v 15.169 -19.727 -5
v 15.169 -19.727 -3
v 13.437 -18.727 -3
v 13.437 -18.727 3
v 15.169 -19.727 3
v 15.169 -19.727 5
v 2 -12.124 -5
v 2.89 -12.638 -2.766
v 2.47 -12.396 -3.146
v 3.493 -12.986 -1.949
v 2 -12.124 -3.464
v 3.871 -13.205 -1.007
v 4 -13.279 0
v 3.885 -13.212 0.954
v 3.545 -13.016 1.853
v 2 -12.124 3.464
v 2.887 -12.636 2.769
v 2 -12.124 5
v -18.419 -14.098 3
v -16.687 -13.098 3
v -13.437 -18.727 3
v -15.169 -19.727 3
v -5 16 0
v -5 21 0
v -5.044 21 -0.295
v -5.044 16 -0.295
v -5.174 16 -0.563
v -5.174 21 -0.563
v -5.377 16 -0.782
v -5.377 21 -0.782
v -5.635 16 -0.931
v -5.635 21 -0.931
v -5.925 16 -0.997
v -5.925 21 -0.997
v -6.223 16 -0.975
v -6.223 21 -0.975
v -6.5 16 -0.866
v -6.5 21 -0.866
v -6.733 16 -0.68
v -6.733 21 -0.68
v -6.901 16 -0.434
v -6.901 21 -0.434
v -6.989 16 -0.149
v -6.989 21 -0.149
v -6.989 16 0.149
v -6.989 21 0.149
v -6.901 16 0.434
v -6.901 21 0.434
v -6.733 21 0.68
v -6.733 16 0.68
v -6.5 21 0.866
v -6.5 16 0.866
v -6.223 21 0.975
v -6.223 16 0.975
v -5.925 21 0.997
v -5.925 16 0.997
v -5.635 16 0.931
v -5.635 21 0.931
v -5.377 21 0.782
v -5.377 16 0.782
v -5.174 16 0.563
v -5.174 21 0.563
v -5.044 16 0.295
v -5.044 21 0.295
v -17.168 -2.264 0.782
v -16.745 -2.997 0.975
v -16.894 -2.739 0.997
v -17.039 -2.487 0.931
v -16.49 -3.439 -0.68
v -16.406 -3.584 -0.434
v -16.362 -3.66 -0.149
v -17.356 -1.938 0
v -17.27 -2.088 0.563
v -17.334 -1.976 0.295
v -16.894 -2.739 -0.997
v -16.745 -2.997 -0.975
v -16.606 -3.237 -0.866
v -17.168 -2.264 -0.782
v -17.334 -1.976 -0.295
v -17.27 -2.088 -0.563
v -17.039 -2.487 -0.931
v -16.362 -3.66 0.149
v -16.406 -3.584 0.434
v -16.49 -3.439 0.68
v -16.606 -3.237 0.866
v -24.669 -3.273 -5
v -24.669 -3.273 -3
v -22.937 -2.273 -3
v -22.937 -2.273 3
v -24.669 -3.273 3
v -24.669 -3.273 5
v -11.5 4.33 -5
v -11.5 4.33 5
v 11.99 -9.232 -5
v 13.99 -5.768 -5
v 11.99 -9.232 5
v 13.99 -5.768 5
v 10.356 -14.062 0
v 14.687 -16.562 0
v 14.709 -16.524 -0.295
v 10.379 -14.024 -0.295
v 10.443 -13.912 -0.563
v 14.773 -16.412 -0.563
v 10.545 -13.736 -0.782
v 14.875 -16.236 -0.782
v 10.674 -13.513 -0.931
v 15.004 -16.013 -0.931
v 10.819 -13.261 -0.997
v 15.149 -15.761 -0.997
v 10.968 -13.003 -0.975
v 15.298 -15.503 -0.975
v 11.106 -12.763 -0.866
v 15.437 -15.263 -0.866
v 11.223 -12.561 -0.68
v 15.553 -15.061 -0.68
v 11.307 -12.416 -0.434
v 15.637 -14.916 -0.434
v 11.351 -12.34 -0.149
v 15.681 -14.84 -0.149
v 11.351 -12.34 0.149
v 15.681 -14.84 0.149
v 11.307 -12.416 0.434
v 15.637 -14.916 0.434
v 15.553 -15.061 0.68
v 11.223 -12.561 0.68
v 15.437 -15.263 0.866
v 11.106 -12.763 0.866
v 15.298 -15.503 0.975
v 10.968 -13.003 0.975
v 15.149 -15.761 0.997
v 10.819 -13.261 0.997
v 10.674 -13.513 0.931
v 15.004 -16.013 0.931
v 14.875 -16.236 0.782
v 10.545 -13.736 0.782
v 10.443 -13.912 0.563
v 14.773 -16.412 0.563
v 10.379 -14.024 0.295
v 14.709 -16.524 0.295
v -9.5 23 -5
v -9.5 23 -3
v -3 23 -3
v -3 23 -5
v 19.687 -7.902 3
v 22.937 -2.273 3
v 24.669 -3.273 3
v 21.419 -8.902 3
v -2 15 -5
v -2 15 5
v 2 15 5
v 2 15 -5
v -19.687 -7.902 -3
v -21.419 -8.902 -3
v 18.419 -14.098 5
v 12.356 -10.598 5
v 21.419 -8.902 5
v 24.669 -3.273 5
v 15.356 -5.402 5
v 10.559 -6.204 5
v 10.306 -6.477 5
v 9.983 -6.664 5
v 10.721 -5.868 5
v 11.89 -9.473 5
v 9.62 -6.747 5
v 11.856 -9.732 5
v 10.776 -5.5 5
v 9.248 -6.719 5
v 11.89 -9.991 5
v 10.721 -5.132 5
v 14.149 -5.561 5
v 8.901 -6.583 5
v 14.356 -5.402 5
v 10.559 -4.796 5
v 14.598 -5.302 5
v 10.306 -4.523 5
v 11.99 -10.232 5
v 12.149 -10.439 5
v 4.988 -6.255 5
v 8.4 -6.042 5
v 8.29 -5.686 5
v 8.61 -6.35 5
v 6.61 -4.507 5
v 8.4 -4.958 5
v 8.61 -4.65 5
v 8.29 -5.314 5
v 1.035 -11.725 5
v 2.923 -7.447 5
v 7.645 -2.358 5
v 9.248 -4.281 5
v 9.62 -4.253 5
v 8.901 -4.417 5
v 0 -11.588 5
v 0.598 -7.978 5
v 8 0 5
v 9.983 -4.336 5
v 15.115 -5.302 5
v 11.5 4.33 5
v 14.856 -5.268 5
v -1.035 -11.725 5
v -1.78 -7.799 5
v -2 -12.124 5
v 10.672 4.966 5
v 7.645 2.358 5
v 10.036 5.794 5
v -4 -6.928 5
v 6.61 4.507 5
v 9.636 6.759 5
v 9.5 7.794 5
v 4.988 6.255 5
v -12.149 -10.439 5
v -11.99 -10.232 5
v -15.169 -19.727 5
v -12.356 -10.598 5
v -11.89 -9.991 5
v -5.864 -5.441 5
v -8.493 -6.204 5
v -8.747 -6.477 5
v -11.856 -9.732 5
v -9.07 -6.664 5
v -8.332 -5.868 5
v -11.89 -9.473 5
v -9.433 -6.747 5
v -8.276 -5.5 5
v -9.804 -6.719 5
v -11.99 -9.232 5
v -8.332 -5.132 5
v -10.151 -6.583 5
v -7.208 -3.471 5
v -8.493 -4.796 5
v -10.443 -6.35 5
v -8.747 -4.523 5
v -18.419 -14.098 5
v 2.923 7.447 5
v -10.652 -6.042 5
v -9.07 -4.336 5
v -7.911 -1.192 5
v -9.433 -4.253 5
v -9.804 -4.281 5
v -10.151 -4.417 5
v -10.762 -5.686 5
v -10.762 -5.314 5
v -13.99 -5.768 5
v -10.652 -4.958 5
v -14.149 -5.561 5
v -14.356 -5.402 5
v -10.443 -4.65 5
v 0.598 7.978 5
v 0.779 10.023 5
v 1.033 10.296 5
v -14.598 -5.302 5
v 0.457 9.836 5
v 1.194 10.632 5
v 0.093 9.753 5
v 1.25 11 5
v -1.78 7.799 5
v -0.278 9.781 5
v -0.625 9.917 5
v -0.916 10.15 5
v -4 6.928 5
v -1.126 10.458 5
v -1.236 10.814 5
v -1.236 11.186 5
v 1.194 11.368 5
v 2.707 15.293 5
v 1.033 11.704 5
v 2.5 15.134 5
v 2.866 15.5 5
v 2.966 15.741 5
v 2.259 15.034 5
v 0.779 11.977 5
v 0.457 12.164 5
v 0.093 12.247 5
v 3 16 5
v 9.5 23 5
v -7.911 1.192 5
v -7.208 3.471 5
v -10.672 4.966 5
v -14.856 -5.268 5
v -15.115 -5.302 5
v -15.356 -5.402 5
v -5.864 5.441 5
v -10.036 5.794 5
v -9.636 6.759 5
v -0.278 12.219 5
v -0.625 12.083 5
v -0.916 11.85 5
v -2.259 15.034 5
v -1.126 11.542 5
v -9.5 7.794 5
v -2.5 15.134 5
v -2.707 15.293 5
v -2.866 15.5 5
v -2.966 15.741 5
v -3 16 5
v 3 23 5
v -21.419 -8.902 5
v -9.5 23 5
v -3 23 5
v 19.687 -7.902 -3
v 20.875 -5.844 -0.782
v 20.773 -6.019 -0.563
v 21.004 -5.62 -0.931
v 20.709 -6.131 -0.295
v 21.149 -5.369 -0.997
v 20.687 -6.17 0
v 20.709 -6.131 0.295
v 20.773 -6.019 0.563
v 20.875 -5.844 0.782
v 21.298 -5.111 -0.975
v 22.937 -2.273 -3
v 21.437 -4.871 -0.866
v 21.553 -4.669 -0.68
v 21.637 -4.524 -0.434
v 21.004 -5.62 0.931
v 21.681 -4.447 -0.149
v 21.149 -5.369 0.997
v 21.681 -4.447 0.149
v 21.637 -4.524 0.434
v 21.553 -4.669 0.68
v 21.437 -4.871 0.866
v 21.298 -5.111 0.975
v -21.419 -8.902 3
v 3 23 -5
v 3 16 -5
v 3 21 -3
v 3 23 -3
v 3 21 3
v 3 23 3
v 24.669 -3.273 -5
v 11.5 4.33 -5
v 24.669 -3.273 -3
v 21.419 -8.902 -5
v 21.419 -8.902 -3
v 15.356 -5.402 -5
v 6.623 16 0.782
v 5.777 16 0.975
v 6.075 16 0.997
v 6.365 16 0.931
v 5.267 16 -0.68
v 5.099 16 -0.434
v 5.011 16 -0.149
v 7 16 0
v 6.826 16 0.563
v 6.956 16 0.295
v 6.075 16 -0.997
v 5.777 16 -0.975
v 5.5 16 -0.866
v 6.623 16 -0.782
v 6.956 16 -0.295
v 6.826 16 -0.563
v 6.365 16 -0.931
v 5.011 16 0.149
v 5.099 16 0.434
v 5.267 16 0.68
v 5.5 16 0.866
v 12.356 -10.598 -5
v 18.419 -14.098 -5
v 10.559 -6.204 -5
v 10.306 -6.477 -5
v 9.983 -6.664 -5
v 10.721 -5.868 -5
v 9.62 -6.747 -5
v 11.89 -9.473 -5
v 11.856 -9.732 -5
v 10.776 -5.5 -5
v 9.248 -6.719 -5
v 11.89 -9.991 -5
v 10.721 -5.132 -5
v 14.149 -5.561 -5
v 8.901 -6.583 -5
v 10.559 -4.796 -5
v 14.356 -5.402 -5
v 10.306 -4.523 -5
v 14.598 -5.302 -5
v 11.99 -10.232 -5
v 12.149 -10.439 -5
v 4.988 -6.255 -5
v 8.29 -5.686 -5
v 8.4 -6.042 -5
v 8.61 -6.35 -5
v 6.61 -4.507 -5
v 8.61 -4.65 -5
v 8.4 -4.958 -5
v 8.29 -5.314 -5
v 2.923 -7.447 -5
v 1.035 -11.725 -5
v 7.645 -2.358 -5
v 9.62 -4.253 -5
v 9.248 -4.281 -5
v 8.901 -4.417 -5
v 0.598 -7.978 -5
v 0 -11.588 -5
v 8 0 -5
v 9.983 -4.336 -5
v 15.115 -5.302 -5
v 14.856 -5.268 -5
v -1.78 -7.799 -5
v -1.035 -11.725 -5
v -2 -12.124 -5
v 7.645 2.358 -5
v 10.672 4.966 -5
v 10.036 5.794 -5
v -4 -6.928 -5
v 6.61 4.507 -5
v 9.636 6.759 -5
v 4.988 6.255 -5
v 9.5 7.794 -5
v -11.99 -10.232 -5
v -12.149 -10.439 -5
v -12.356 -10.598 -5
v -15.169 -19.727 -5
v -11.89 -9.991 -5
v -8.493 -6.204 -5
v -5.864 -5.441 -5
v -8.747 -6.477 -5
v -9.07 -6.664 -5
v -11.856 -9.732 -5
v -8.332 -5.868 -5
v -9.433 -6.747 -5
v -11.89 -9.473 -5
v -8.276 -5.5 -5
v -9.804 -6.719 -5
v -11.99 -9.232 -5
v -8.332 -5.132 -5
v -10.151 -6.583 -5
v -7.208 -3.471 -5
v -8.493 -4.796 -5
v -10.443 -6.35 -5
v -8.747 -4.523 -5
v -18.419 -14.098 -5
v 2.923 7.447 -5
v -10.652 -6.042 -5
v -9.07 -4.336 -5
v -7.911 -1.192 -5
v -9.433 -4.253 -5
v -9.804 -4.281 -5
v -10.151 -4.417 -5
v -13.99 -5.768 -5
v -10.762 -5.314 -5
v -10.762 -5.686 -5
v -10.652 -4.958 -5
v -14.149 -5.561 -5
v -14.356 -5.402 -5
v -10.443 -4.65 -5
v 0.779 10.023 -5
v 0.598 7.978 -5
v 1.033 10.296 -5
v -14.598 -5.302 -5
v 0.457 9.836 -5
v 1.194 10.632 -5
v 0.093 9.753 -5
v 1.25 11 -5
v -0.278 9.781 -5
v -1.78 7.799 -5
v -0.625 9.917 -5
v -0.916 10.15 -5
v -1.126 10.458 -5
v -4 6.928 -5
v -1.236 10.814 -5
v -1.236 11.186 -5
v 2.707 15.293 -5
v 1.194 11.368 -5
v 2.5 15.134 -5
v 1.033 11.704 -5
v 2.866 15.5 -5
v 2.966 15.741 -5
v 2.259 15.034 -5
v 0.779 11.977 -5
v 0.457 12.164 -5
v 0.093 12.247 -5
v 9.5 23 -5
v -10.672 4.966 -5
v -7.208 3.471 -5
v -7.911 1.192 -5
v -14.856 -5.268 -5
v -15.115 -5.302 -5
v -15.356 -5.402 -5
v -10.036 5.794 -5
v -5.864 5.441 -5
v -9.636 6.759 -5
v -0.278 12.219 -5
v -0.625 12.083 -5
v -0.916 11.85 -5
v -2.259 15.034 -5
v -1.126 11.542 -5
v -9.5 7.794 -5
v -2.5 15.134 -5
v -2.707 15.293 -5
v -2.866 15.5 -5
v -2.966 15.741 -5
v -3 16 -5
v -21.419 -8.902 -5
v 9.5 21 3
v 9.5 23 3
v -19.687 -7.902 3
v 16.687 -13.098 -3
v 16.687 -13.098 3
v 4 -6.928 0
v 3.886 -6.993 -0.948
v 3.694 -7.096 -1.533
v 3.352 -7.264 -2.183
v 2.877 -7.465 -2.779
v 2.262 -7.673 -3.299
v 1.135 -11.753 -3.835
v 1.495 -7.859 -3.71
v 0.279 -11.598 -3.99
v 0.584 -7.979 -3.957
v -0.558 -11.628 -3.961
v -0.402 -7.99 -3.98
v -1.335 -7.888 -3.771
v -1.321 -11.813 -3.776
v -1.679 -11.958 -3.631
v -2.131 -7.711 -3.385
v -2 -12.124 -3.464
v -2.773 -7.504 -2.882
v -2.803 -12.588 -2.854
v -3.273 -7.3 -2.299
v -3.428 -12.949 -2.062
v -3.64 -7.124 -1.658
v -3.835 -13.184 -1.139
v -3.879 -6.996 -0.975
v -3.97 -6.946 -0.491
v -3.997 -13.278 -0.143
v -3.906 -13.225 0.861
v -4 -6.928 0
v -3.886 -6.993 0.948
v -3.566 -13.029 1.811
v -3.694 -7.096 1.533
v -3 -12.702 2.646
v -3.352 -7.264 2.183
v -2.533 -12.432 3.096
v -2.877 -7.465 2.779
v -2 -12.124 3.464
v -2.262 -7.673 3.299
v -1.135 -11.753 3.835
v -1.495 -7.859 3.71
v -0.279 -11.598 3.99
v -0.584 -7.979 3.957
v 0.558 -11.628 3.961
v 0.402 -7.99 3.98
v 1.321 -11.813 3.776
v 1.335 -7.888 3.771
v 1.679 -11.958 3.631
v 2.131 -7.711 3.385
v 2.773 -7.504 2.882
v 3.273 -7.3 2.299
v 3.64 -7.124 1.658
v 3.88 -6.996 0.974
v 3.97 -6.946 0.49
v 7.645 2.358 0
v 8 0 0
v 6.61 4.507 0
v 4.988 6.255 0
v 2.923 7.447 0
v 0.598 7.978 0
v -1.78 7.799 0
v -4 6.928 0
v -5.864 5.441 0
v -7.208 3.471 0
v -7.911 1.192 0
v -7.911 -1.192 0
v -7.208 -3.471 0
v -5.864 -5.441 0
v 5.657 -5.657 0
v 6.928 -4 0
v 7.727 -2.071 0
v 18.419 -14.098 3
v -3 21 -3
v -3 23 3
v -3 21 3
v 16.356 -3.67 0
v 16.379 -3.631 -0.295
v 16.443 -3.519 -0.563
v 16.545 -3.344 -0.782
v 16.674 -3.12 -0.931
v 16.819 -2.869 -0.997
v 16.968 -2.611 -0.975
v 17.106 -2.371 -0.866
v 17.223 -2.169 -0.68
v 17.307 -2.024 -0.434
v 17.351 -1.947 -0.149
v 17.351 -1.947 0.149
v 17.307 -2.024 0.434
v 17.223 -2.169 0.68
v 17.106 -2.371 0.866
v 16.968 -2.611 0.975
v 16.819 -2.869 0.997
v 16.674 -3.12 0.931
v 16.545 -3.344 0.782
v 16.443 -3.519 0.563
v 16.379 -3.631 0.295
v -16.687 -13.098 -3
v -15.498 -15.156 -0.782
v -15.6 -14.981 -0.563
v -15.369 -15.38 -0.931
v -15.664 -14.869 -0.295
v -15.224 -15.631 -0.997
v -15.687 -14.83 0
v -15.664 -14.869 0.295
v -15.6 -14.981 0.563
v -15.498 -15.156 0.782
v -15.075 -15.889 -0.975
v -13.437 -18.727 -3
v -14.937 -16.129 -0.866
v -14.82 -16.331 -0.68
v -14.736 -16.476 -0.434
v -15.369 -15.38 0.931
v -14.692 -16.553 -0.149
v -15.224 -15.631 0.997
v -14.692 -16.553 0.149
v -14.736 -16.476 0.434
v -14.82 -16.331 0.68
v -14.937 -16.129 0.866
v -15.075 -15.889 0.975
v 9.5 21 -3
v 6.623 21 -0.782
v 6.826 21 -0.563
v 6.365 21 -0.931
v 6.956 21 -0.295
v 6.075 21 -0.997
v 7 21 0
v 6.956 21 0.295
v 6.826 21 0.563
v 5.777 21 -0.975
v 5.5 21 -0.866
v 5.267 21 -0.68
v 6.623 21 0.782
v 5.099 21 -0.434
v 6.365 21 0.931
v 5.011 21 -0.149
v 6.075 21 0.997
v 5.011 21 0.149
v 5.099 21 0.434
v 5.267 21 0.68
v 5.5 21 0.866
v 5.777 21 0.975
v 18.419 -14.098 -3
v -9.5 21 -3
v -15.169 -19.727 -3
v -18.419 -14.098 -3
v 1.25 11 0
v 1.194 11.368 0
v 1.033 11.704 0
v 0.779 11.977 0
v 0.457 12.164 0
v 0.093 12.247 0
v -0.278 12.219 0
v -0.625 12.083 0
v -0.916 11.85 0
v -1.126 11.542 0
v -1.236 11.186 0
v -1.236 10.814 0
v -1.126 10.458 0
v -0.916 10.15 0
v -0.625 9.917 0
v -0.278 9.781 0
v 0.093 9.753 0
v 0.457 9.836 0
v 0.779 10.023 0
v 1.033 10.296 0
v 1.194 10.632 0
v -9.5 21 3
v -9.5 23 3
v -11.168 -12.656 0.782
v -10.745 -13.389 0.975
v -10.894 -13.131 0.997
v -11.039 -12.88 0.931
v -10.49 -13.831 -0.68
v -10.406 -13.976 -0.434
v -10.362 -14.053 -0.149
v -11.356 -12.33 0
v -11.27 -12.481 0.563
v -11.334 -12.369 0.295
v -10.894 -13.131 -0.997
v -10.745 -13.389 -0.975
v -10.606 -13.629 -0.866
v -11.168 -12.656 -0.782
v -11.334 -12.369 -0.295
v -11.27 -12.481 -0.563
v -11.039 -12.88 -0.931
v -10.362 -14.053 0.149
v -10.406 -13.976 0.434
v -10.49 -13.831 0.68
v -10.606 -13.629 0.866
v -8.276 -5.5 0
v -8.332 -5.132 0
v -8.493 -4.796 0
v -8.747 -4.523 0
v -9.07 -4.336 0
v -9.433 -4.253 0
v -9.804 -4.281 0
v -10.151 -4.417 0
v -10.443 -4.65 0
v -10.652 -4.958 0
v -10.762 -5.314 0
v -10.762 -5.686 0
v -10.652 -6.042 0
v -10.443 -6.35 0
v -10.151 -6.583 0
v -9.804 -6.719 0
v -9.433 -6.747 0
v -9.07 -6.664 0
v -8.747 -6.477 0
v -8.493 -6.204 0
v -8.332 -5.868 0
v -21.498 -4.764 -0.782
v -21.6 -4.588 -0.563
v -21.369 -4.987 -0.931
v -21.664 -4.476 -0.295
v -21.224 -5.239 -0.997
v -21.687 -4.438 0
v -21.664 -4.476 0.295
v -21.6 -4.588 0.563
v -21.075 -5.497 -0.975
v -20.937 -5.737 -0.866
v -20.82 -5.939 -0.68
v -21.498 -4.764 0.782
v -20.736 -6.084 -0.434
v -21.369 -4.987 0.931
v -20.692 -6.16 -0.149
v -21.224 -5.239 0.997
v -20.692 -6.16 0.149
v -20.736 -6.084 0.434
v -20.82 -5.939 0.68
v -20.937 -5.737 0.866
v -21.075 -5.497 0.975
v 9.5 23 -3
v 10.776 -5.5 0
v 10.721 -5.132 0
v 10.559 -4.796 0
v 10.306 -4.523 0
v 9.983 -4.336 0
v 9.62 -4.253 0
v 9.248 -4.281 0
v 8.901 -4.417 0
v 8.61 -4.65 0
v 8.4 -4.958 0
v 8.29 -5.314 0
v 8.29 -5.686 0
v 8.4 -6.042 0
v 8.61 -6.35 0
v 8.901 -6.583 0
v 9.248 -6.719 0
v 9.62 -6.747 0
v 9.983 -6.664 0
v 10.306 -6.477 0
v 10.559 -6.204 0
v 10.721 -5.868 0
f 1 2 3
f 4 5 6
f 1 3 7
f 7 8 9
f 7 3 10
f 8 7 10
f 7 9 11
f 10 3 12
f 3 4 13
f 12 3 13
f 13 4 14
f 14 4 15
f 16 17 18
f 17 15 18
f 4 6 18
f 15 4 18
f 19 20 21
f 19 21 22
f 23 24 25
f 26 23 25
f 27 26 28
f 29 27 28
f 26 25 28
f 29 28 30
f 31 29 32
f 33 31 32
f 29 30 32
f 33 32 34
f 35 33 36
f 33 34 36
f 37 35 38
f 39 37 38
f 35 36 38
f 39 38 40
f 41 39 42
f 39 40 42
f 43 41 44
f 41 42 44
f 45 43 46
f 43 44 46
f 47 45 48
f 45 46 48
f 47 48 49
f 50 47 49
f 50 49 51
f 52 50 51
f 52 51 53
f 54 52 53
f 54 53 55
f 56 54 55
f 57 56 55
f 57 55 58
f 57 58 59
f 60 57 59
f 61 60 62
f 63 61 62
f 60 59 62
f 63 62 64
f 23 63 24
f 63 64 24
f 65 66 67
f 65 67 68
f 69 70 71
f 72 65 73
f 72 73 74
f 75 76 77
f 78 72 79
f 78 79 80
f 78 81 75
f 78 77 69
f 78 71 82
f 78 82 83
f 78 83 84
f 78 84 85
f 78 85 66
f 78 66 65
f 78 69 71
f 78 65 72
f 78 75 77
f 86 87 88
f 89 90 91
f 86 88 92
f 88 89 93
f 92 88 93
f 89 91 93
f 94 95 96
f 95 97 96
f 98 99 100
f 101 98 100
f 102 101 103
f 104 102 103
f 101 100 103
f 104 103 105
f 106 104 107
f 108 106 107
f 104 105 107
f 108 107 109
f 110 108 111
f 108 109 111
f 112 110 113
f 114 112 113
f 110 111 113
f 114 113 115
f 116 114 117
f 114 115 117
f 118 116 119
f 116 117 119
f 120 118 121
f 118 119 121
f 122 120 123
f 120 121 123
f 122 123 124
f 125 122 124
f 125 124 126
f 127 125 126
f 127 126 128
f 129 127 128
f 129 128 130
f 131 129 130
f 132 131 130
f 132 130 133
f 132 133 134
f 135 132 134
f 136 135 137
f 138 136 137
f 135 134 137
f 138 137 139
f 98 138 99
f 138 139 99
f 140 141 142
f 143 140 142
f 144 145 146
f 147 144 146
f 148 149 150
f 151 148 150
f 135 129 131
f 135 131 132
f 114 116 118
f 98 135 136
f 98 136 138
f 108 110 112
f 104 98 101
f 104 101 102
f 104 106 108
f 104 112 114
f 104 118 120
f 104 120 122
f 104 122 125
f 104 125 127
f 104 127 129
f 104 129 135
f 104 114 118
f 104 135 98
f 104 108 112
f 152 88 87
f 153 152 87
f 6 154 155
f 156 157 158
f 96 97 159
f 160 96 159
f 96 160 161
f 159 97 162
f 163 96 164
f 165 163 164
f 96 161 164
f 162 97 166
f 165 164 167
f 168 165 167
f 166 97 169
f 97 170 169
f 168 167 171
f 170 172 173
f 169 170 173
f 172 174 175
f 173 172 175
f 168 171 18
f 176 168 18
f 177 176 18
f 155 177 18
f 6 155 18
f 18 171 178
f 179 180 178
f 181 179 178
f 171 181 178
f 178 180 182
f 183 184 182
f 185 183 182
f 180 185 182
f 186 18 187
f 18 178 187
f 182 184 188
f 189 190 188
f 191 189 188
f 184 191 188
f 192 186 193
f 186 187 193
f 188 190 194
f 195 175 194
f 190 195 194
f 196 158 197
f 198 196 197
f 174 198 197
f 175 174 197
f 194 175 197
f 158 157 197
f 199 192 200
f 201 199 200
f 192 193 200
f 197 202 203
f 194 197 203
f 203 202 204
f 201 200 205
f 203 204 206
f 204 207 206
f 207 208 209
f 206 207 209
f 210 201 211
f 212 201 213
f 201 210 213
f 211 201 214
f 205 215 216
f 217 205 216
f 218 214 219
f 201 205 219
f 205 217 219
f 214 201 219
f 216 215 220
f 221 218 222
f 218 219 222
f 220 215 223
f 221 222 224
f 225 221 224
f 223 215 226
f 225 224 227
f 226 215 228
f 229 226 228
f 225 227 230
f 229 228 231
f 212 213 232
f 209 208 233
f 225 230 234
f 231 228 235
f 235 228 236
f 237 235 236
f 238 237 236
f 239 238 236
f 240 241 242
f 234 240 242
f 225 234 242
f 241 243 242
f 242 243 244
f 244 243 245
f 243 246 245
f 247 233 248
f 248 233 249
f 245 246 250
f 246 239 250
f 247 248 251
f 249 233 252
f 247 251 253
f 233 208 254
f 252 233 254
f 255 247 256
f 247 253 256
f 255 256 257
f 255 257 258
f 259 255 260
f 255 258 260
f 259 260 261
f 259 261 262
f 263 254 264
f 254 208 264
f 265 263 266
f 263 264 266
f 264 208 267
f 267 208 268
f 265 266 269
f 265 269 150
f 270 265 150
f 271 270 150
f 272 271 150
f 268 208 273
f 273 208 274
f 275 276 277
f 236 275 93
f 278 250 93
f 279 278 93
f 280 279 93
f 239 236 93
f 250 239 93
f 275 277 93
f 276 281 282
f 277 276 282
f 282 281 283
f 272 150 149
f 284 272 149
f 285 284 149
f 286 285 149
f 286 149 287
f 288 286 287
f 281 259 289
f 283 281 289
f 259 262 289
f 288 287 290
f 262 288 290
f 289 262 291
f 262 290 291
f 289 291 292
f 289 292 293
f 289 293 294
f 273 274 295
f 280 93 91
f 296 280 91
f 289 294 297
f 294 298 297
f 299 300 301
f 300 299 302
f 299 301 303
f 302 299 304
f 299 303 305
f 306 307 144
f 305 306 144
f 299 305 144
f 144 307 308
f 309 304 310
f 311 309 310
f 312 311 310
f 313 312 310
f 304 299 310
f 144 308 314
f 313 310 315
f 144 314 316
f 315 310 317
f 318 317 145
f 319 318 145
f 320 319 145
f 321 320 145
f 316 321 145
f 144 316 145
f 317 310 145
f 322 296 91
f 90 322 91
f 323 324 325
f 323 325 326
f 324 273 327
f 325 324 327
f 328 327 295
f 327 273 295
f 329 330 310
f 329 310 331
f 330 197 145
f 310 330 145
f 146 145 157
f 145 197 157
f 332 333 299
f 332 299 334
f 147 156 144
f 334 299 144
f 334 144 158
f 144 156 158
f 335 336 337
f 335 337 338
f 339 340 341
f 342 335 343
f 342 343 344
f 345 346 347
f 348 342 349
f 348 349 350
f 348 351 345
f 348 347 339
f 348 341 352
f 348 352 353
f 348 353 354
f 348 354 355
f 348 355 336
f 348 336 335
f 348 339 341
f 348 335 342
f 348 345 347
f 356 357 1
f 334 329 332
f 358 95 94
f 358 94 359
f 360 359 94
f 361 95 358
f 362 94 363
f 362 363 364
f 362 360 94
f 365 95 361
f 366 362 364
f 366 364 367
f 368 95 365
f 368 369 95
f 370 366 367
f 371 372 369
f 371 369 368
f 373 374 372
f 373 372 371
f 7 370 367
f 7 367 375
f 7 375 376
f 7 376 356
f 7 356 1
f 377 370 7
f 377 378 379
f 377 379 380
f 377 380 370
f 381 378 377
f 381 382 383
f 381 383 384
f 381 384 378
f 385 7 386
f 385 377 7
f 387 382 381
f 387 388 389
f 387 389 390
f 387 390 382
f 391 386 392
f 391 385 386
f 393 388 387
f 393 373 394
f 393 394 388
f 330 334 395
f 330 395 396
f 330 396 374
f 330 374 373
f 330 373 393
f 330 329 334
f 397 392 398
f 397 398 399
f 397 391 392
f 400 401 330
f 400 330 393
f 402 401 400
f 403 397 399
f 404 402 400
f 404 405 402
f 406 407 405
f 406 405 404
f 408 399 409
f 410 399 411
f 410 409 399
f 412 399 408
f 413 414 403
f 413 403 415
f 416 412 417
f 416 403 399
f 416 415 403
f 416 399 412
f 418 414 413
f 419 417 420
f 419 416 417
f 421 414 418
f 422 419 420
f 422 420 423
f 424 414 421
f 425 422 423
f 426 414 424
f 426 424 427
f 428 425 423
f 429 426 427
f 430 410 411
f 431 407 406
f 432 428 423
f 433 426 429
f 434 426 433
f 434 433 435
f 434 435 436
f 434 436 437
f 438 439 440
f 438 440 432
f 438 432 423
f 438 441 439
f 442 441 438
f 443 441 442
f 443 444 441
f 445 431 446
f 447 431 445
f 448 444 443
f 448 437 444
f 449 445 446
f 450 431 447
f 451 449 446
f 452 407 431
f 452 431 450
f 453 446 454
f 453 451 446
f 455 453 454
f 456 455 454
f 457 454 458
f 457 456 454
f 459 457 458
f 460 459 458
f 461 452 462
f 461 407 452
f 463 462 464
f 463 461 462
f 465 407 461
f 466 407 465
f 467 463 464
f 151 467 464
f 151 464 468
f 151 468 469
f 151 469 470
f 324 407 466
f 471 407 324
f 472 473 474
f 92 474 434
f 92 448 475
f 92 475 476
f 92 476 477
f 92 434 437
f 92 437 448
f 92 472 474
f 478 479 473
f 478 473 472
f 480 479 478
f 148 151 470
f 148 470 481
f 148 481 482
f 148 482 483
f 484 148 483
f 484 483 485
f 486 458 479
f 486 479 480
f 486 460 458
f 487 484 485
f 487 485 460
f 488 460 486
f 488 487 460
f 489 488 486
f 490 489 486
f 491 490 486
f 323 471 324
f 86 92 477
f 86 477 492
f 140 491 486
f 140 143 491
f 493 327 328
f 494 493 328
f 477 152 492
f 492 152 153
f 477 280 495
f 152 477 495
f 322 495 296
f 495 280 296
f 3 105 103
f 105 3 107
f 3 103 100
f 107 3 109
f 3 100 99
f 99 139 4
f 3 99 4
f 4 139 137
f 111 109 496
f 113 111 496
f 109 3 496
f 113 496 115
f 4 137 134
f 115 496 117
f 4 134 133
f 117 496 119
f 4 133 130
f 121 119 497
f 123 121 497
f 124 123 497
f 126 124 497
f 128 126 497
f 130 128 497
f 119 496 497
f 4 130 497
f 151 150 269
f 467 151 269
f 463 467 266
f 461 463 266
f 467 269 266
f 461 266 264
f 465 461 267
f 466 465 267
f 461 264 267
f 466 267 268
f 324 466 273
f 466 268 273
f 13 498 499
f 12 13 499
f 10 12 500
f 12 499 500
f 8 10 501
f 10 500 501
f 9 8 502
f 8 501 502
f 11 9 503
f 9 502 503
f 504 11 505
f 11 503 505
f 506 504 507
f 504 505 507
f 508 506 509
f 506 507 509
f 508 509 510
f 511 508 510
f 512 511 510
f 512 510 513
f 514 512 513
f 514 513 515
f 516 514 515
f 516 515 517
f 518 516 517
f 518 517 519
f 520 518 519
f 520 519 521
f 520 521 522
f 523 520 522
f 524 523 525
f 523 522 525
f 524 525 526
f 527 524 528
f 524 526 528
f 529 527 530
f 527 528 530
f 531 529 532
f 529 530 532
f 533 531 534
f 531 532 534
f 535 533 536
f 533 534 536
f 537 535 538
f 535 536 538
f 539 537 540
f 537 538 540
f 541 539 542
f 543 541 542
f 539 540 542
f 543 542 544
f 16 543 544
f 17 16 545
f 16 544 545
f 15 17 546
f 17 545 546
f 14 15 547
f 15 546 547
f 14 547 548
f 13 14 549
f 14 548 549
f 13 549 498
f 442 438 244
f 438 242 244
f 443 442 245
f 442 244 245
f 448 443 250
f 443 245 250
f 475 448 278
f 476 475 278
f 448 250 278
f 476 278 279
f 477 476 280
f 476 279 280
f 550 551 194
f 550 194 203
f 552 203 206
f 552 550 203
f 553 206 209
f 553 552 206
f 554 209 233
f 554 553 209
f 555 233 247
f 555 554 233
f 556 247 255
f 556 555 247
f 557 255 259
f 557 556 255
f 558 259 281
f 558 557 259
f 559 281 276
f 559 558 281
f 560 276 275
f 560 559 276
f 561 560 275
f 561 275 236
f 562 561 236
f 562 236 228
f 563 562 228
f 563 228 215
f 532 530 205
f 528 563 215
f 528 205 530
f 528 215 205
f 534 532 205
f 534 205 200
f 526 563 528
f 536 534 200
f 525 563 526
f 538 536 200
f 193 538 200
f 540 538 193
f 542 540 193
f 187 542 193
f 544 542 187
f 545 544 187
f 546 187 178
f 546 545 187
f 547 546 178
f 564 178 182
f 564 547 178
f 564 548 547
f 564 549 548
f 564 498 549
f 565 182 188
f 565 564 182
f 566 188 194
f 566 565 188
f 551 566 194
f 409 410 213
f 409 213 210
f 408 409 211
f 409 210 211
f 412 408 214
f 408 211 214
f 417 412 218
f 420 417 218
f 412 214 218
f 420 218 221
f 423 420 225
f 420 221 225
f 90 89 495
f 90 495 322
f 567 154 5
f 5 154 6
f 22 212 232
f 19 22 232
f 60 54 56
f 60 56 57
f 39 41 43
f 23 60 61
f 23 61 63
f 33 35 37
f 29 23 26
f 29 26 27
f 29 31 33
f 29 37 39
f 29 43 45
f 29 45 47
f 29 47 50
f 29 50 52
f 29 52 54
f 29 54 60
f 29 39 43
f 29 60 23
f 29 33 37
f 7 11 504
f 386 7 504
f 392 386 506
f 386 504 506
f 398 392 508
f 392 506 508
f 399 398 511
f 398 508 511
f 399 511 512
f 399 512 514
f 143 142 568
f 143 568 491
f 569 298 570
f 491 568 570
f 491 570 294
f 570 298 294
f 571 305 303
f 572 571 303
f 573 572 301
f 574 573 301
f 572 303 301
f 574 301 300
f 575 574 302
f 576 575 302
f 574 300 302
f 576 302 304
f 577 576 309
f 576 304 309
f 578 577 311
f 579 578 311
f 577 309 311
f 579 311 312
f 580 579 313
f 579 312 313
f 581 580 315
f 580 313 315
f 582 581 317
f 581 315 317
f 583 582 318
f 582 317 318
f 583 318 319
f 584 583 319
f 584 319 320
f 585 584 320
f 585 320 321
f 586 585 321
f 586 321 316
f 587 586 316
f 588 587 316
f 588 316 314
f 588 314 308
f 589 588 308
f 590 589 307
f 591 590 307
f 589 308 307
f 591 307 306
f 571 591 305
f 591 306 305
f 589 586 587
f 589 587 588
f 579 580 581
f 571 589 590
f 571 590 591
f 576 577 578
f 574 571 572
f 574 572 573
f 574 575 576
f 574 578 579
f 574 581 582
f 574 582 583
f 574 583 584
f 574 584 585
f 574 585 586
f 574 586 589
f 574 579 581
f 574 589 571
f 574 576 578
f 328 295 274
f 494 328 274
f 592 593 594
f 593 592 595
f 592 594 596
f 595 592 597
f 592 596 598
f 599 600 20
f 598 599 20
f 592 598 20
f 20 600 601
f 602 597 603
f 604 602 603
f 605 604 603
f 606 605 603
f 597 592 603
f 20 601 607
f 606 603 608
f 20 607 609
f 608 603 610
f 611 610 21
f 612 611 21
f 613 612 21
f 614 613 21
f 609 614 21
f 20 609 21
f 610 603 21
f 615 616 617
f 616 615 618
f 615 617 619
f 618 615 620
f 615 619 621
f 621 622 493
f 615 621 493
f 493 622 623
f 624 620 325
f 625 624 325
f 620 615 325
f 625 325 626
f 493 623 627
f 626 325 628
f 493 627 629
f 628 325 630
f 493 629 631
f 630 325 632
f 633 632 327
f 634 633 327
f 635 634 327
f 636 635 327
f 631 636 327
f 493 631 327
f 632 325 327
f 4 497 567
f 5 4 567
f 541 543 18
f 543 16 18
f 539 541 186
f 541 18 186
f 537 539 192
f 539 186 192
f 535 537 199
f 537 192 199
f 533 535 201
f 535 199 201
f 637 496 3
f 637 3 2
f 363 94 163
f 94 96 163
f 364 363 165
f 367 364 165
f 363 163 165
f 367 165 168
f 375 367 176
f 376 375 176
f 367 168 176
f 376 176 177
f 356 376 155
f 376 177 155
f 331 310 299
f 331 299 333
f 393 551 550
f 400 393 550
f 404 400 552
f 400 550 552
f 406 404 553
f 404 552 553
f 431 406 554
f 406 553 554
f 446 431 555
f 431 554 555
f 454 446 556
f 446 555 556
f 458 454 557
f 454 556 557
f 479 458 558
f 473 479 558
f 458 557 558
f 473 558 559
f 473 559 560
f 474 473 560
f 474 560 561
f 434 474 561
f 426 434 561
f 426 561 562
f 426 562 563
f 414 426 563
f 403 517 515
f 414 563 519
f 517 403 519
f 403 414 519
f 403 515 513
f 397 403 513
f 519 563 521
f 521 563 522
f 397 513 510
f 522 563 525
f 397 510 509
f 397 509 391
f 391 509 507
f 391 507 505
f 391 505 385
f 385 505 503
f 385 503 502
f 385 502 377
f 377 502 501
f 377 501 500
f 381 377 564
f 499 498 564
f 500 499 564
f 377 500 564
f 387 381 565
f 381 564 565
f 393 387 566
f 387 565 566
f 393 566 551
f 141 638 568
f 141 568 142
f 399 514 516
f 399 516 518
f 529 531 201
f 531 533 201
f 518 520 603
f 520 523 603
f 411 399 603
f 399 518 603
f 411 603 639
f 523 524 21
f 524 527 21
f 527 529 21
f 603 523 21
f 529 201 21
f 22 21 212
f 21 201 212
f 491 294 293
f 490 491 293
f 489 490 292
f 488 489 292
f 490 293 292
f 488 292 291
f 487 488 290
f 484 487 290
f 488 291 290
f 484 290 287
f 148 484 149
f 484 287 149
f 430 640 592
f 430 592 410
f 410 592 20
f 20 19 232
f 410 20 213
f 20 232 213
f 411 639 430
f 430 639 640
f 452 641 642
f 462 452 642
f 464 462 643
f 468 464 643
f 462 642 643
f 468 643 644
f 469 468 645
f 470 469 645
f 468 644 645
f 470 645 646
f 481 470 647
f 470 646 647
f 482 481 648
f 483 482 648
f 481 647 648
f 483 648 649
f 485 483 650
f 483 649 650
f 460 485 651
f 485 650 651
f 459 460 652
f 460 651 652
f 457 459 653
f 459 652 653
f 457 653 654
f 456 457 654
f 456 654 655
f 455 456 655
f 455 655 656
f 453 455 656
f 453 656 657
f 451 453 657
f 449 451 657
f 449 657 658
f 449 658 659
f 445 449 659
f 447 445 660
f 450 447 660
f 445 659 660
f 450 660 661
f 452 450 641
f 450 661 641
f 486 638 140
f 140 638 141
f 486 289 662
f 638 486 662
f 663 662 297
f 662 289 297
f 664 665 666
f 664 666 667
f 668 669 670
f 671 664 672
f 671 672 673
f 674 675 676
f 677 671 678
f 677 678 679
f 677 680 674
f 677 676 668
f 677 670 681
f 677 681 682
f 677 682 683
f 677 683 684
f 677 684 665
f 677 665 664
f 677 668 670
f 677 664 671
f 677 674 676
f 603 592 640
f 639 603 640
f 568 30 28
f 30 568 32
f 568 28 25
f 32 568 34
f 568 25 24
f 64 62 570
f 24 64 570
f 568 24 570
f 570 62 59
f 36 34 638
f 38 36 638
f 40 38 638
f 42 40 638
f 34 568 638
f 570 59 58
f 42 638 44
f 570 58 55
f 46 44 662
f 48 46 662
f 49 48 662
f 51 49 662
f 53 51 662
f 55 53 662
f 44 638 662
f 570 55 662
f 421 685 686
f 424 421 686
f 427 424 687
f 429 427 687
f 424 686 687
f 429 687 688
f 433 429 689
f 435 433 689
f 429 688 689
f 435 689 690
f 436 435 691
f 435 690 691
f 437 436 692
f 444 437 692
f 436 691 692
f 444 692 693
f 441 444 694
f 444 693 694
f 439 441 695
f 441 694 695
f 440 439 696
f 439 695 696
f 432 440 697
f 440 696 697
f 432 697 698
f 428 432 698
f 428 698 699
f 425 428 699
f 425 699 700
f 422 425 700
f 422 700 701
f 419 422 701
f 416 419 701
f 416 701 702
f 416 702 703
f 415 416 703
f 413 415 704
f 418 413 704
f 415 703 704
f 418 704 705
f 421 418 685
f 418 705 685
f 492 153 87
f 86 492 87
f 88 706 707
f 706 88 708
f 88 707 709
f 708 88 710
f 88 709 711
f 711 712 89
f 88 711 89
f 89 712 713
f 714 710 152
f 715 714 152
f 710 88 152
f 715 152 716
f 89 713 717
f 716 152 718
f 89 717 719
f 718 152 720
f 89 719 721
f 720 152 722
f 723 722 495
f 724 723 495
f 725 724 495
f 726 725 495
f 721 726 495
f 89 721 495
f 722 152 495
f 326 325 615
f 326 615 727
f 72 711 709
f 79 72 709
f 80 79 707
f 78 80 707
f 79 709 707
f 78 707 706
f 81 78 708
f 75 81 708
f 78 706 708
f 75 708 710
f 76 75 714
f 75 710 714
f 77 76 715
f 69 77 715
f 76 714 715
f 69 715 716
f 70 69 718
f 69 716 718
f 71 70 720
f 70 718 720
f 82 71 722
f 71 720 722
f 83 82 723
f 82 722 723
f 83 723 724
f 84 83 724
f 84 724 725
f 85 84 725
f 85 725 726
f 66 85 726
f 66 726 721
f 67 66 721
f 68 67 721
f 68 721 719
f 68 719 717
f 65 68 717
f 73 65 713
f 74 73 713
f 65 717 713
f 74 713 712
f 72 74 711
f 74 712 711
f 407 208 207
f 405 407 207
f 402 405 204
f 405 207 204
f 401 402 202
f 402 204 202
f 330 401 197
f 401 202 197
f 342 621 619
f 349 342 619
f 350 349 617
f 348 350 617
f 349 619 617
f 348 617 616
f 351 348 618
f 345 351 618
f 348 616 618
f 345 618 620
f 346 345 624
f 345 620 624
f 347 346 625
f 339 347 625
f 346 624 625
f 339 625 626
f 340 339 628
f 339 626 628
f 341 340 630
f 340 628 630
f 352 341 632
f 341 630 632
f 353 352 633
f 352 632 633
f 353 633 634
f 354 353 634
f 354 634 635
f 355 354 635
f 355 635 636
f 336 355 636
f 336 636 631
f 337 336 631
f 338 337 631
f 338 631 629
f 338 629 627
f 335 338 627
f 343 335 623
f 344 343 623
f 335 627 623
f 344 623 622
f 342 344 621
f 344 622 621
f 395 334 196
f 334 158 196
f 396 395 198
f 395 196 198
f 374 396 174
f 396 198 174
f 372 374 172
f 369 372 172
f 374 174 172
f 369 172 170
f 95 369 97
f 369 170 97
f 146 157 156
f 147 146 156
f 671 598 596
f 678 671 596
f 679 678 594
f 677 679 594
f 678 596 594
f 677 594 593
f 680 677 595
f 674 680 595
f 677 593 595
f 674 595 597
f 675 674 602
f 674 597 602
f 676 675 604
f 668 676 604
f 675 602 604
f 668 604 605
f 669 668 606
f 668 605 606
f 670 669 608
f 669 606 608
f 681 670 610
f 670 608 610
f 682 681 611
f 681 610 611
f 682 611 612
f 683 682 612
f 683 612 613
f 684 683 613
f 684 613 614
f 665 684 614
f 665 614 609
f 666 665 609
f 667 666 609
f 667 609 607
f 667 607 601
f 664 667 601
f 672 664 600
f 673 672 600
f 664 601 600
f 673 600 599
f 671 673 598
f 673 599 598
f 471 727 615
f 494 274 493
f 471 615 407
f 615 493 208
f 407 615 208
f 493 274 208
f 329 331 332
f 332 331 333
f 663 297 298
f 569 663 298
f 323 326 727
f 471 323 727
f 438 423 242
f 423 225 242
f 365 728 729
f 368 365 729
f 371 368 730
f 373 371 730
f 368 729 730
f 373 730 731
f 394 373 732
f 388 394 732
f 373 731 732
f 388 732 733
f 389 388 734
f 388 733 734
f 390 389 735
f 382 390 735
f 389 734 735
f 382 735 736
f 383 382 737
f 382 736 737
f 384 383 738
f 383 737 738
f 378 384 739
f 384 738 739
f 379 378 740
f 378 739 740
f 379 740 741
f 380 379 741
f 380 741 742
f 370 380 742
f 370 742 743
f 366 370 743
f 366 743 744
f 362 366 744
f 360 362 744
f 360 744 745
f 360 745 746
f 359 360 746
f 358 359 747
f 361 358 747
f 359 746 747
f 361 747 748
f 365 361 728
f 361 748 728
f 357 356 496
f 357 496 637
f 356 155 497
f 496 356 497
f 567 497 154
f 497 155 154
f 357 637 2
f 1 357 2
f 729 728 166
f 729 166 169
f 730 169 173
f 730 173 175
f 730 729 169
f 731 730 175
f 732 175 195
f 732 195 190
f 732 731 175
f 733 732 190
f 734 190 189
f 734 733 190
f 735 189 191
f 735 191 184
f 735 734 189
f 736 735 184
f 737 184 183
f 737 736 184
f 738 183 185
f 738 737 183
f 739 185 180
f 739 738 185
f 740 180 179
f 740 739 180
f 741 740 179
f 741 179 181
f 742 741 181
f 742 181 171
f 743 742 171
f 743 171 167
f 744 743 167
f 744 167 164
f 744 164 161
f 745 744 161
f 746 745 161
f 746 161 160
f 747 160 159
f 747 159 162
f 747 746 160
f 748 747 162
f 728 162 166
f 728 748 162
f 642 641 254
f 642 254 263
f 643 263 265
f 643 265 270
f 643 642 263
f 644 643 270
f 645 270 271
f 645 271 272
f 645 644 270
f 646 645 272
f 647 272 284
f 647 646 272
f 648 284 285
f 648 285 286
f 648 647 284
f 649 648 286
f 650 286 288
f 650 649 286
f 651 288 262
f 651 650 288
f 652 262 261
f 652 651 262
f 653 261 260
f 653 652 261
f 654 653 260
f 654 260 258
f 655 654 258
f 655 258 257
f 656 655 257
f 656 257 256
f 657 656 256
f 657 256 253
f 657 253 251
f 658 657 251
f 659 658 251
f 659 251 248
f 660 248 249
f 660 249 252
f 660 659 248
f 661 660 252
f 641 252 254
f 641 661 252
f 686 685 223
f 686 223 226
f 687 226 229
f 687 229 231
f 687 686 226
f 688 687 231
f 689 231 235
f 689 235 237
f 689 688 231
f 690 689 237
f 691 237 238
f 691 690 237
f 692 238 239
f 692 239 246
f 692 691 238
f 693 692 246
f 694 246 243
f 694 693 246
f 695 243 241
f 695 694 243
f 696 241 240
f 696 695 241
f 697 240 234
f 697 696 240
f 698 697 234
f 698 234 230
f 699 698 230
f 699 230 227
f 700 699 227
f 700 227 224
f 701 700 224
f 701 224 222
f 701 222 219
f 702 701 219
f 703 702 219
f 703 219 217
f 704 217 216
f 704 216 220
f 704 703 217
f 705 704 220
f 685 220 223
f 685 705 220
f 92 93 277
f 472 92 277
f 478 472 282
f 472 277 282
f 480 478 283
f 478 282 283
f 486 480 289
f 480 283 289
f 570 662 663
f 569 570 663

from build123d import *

# Parameters (mm, degrees)
BOSS_EXTRU_1_DEPTH           = 5
BOSS_EXTRU_1_DEPTH_BACK      = 5
ESQUISSE1_R                  = 1.25
ESQUISSE1_R_2                = 8
ESQUISSE2_W                  = 6
ESQUISSE2_H                  = 2
ENL_V_MAT_EXTRU_1_DEPTH      = 19
ESQUISSE3_R                  = 1
ENL_V_MAT_EXTRU_2_DEPTH      = 5
R_P_TITION_CIRCULAIRE1_COUNT = 3
ESQUISSE5_R                  = 4
ENL_V_MAT_EXTRU_5_DEPTH      = 18


with BuildPart() as part:
    # Esquisse1 → Boss.-Extru.1 (new, two sides: drawn at the far end of the back side and taken through both)
    with BuildSketch(Plane.XY.offset(-BOSS_EXTRU_1_DEPTH_BACK)):
        with BuildLine():
            Line((21.418584287, -8.901923789), (24.668584287, -3.272758664))
            Line((24.668584287, -3.272758664), (11.5, 4.330127019))
            ThreePointArc((11.5, 4.330127019), (10.035898385, 5.794228634), (9.5, 7.794228634))
            Line((9.5, 7.794228634), (9.5, 23))
            Line((9.5, 23), (3, 23))
            Line((3, 23), (3, 16))
            ThreePointArc((3, 16), (2.707106781, 15.292893219), (2, 15))
            Line((2, 15), (-2, 15))
            ThreePointArc((-2, 15), (-2.707106781, 15.292893219), (-3, 16))
            Line((-3, 16), (-3, 23))
            Line((-3, 23), (-9.5, 23))
            Line((-9.5, 23), (-9.5, 7.794228634))
            ThreePointArc((-9.5, 7.794228634), (-10.035898385, 5.794228634), (-11.5, 4.330127019))
            Line((-11.5, 4.330127019), (-24.668584287, -3.272758664))
            Line((-24.668584287, -3.272758664), (-21.418584287, -8.901923789))
            Line((-21.418584287, -8.901923789), (-15.356406461, -5.401923789))
            ThreePointArc((-15.356406461, -5.401923789), (-14.597587415, -5.302023366), (-13.990381057, -5.767949192))
            Line((-13.990381057, -5.767949192), (-11.990381057, -9.232050808))
            ThreePointArc((-11.990381057, -9.232050808), (-11.890480634, -9.990869853), (-12.356406461, -10.598076211))
            Line((-12.356406461, -10.598076211), (-18.418584287, -14.098076211))
            Line((-18.418584287, -14.098076211), (-15.168584287, -19.727241336))
            Line((-15.168584287, -19.727241336), (-2, -12.124355653))
            ThreePointArc((-2, -12.124355653), (0, -11.588457268), (2, -12.124355653))
            Line((2, -12.124355653), (15.168584287, -19.727241336))
            Line((15.168584287, -19.727241336), (18.418584287, -14.098076211))
            Line((18.418584287, -14.098076211), (12.356406461, -10.598076211))
            ThreePointArc((12.356406461, -10.598076211), (11.890480634, -9.990869853), (11.990381057, -9.232050808))
            Line((11.990381057, -9.232050808), (13.990381057, -5.767949192))
            ThreePointArc((13.990381057, -5.767949192), (14.597587415, -5.302023366), (15.356406461, -5.401923789))
            Line((15.356406461, -5.401923789), (21.418584287, -8.901923789))
        make_face()
        with Locations((-9.526279442, -5.5)):
            Circle(ESQUISSE1_R, mode=Mode.SUBTRACT)
        Circle(ESQUISSE1_R_2, mode=Mode.SUBTRACT)
        with Locations((9.526279442, -5.5)):
            Circle(ESQUISSE1_R, mode=Mode.SUBTRACT)
        with Locations((0, 11)):
            Circle(ESQUISSE1_R, mode=Mode.SUBTRACT)
    extrude(amount=BOSS_EXTRU_1_DEPTH + BOSS_EXTRU_1_DEPTH_BACK)

    # Esquisse2 → Enlèv. mat.-Extru.1 (cut)
    with BuildSketch(Plane.ZY.offset(9.5)):
        with Locations((0, 22)):
            Rectangle(ESQUISSE2_W, ESQUISSE2_H)
    enl_v_mat_extru_1 = extrude(amount=-ENL_V_MAT_EXTRU_1_DEPTH, mode=Mode.SUBTRACT)

    # Esquisse3 → Enlèv. mat.-Extru.2 (cut)
    with BuildSketch(Plane(origin=(0, 21, 0), x_dir=(1, 0, 0), z_dir=(0, 1, 0))):
        with Locations((-6, 0)):
            Circle(ESQUISSE3_R)
        with Locations((6, 0)):
            Circle(ESQUISSE3_R)
    enl_v_mat_extru_2 = extrude(amount=-ENL_V_MAT_EXTRU_2_DEPTH, mode=Mode.SUBTRACT)

    # Répétition circulaire1: Enlèv. mat.-Extru.1, Enlèv. mat.-Extru.2 ×3 about axis
    r_p_tition_circulaire1_axis = Axis((0, 0, -5), (0, 0, 1))
    add([enl_v_mat_extru_1.rotate(r_p_tition_circulaire1_axis, i * 360 / R_P_TITION_CIRCULAIRE1_COUNT) for i in range(1, R_P_TITION_CIRCULAIRE1_COUNT)], mode=Mode.SUBTRACT)
    add([enl_v_mat_extru_2.rotate(r_p_tition_circulaire1_axis, i * 360 / R_P_TITION_CIRCULAIRE1_COUNT) for i in range(1, R_P_TITION_CIRCULAIRE1_COUNT)], mode=Mode.SUBTRACT)

    # Esquisse5 → Enlèv. mat.-Extru.5 (cut)
    with BuildSketch(Plane(origin=(0, 0, 0), x_dir=(1, 0, 0), z_dir=(0, 1, 0))):
        Circle(ESQUISSE5_R)
    extrude(amount=-ENL_V_MAT_EXTRU_5_DEPTH, mode=Mode.SUBTRACT)


solid = part.part
